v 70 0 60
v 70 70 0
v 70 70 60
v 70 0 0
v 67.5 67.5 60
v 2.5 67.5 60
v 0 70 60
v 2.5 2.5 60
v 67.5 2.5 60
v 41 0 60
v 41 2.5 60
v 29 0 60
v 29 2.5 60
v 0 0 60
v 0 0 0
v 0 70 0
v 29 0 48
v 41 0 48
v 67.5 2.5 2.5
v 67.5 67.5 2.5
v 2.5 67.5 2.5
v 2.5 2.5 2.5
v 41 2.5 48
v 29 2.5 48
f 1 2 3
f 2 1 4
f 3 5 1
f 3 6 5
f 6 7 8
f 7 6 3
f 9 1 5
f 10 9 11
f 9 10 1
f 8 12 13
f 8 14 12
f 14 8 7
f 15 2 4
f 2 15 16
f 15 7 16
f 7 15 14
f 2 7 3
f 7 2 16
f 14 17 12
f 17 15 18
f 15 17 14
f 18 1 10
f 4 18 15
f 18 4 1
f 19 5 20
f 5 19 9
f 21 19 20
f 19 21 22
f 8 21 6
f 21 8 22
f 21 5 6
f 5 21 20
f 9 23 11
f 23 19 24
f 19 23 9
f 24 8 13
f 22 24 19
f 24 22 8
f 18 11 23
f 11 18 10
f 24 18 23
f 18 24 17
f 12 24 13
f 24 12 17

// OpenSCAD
$fn = 32;

// ----------------------------------------------------------------------
// Enclosure box: notch enclosure
// ----------------------------------------------------------------------

// --- parameters (mm) ---
box_l = 70;               // outer length, X
box_w = 70;               // outer width, Y
box_h = 60;               // outer height
wall_t = 2.5;             // wall thickness
notch_w = 12;             // cable notch width
notch_h = 12;             // cable notch height
fit_tol = 0.1;            // tolerance for press fits, mm
free_tol = 0.3;           // tolerance for clearance fits, mm

inner_h = box_h - wall_t;  // cavity depth
boss_h = inner_h - 2;  // corner boss height

difference() {
  union() {
    difference() {
      cube([box_l, box_w, box_h]);
      translate([wall_t, wall_t, wall_t])
        cube([box_l - 2 * wall_t, box_w - 2 * wall_t, box_h]);
    }
  }
  translate([box_l / 2 - notch_w / 2, -1, box_h - notch_h])
    cube([notch_w, wall_t + 2, notch_h + 1]);
}
